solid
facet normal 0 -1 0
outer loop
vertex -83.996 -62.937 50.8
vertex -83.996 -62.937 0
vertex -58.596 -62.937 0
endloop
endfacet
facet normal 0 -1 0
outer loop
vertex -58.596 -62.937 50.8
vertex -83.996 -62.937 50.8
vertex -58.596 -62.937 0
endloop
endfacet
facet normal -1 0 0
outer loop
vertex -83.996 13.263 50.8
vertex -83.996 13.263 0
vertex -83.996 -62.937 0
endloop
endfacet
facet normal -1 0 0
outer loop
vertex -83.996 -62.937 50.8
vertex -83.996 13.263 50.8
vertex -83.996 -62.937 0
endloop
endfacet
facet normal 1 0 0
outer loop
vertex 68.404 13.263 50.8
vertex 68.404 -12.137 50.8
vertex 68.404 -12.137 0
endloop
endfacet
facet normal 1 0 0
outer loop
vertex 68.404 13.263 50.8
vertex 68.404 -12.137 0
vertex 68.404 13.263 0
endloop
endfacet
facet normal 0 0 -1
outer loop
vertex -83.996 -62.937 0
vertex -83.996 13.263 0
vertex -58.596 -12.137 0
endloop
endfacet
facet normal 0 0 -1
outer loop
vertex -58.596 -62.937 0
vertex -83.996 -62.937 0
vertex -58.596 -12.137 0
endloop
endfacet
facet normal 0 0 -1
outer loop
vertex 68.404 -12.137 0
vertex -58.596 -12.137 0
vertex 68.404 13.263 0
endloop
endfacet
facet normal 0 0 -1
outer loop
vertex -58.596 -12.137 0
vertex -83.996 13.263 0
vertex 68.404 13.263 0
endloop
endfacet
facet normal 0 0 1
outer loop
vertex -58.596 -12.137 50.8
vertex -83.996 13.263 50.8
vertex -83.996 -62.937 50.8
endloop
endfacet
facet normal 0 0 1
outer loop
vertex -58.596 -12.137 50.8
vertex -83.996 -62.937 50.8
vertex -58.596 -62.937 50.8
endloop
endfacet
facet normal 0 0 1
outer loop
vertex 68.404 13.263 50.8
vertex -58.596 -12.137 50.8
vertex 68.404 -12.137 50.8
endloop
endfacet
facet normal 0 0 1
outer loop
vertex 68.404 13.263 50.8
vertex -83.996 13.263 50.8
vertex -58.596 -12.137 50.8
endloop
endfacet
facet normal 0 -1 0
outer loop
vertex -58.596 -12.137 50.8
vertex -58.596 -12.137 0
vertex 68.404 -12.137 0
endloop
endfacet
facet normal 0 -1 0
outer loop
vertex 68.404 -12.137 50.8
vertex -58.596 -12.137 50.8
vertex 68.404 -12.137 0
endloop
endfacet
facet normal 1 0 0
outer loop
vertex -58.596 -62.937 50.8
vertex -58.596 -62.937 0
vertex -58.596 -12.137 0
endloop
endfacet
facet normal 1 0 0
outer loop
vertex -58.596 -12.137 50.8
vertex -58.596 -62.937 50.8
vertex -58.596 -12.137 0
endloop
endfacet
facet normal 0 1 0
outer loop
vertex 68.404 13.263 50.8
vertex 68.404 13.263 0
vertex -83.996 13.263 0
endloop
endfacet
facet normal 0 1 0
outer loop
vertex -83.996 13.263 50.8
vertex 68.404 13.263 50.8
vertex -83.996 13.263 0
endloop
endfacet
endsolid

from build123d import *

# Parameters (mm, degrees)
F0_W     = 50.8
F0_H     = 25.4
F1_DEPTH = 50.8


with BuildPart() as f1:
    # F0 (on Top) → F1 (new body)
    with BuildSketch(Plane.XY):
        with Locations((43.003823, 0.562944)):
            Rectangle(F0_W, F0_H)
        Polygon((-83.996177, 13.262944), (-83.996177, -62.937056), (-58.596177, -62.937056), (-58.596177, -12.137056), (17.603823, -12.137056), (17.603823, 13.262944), align=None)
    extrude(amount=F1_DEPTH)


solid = f1.part
